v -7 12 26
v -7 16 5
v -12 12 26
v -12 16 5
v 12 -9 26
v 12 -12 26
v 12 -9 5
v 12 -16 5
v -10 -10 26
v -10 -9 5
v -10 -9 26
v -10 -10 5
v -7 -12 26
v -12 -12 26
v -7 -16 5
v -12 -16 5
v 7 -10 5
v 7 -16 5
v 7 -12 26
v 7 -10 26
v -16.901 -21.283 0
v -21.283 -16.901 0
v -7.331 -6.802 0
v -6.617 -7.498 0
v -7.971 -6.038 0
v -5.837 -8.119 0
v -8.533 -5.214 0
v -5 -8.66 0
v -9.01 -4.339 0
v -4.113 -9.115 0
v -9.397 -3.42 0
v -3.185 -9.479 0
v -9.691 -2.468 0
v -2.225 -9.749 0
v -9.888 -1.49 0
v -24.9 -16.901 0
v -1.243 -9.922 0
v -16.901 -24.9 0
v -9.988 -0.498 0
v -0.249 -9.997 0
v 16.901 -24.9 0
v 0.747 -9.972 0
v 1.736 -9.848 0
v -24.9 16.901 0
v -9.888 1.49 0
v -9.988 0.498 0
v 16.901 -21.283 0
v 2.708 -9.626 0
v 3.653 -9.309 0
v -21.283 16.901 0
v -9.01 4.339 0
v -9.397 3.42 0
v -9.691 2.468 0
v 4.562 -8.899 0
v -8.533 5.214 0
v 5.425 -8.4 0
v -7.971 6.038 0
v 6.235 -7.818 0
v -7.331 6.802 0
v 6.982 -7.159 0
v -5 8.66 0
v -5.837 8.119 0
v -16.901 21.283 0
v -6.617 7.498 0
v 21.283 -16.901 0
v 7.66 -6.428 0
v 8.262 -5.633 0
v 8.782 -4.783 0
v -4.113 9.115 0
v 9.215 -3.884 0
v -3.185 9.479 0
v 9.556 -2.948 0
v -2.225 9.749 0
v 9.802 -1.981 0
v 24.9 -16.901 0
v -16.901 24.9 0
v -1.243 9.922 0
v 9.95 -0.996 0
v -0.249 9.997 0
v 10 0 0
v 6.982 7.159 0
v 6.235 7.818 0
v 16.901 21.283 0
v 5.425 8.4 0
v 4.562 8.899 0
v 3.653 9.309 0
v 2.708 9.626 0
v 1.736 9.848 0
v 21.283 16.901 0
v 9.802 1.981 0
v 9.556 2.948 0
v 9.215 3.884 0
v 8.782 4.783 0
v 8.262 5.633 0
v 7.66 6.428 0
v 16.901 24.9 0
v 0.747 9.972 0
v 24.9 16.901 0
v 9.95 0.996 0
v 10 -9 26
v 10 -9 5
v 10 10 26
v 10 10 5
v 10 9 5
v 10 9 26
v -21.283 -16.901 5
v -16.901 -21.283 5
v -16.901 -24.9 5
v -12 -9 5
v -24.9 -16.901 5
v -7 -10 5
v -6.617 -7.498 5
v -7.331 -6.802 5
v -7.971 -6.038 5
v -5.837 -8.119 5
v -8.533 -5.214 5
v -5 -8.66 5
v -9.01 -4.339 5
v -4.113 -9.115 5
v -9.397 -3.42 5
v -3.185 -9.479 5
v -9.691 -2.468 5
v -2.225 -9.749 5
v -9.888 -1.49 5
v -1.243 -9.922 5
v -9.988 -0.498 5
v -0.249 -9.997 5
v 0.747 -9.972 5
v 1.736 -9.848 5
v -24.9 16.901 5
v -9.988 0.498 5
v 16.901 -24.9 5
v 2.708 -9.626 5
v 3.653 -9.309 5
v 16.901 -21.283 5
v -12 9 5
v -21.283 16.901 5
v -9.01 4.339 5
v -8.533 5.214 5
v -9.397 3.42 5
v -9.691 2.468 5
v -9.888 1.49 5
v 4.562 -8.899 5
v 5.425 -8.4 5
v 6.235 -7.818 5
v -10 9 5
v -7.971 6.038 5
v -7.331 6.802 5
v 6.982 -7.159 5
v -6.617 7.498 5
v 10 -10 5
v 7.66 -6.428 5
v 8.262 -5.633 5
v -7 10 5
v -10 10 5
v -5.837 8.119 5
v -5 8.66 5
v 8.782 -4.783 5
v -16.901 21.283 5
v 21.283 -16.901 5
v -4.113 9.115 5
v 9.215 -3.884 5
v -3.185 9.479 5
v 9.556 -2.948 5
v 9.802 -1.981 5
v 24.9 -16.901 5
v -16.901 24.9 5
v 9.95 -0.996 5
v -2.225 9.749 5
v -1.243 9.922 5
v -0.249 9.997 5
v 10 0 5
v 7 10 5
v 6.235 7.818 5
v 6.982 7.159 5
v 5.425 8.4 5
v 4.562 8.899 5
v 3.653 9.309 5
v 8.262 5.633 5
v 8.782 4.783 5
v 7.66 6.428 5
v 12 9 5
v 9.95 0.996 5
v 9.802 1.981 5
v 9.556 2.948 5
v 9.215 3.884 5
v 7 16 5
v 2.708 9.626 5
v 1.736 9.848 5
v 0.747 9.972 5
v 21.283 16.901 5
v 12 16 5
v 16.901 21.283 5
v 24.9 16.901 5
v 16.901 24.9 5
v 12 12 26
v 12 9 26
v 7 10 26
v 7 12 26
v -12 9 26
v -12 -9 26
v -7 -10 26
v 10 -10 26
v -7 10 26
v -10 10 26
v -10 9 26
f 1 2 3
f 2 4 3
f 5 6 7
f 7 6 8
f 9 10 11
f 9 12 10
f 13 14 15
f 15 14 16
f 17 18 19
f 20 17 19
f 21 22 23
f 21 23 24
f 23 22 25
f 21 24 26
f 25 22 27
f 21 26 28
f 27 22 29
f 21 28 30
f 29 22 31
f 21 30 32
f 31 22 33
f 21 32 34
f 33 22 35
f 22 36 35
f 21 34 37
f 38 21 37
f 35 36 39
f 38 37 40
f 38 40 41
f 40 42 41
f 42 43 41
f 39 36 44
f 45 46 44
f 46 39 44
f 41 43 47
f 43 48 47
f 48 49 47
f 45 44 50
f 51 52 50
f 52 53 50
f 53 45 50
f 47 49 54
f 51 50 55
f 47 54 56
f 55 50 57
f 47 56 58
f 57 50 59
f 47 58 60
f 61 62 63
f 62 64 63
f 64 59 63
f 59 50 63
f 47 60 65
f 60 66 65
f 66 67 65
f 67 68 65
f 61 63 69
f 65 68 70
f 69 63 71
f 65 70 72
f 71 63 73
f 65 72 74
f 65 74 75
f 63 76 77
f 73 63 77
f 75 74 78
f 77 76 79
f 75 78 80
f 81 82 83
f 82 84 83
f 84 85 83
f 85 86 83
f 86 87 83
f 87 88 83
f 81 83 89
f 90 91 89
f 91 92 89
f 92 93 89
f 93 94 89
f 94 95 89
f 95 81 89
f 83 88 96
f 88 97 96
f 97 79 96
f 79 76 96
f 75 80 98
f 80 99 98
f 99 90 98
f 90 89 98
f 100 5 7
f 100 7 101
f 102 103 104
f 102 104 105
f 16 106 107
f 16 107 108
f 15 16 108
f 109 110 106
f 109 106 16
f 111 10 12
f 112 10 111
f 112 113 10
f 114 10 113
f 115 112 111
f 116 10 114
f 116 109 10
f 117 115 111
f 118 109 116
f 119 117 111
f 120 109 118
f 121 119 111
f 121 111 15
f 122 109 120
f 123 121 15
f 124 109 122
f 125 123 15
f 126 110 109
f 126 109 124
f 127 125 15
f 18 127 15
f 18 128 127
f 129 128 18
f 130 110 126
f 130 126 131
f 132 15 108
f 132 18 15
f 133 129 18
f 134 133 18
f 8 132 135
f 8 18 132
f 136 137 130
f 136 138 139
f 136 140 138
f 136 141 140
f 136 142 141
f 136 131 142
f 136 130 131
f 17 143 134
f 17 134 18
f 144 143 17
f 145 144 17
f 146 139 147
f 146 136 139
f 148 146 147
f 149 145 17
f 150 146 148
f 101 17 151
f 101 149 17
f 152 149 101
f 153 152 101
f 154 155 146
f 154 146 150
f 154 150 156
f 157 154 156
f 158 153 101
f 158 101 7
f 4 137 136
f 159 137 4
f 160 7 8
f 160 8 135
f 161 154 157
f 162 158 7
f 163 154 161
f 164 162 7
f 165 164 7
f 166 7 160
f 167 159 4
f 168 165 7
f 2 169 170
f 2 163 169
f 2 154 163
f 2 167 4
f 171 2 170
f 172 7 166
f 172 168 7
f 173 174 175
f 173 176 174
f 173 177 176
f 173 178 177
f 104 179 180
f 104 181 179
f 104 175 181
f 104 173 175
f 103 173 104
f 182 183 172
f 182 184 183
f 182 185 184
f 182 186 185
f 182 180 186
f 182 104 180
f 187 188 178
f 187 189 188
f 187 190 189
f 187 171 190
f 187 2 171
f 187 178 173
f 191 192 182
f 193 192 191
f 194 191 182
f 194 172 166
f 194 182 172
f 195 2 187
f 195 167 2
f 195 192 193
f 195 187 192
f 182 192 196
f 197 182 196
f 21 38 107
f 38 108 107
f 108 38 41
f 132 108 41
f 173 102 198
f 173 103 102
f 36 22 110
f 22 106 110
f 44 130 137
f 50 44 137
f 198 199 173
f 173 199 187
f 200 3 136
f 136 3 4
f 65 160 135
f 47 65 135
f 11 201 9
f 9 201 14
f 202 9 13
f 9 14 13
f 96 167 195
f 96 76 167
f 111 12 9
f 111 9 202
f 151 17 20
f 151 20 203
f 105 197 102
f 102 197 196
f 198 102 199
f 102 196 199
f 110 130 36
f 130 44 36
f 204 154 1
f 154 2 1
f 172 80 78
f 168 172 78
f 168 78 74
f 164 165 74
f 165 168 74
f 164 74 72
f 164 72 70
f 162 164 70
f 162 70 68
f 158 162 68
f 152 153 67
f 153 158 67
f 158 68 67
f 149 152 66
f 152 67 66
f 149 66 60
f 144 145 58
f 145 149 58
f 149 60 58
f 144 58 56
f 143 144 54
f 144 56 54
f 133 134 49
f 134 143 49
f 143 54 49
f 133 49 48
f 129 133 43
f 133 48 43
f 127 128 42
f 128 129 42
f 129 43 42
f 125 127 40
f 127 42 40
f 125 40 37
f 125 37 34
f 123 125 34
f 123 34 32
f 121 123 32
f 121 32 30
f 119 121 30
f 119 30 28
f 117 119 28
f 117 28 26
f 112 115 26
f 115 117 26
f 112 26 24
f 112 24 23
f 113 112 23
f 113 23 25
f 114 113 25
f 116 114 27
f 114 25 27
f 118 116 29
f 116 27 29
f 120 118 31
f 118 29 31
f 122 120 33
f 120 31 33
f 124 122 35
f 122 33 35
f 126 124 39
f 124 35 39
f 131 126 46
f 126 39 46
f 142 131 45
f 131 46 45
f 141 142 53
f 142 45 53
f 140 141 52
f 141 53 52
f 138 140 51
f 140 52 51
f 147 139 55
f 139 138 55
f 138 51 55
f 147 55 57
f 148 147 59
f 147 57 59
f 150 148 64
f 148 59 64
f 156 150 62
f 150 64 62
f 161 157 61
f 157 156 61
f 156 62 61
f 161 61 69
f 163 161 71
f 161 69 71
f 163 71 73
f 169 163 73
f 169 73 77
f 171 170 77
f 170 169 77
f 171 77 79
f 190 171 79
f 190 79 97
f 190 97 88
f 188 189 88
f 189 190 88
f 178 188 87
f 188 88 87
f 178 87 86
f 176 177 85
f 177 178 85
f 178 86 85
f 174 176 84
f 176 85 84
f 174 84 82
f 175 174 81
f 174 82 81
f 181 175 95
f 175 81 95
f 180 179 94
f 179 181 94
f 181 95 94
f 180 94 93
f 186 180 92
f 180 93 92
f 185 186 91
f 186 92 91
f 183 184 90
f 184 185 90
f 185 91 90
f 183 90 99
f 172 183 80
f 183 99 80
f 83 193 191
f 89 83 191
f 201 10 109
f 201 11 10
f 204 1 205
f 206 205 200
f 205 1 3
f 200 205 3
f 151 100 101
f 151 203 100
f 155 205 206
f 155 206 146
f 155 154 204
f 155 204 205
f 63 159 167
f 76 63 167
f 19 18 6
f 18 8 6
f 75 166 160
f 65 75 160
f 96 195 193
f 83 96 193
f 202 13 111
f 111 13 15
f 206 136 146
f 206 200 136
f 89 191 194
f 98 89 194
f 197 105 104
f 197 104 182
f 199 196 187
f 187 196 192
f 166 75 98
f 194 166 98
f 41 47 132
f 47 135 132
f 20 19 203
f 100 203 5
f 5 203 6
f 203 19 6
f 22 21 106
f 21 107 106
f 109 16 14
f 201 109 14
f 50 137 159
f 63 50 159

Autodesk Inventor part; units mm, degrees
ref_plane "YZ Plane" through (0, 0, 0) normal (1, 0, 0) x (0, 1, 0)
ref_plane "XZ Plane" through (0, 0, 0) normal (0, 1, 0) x (-1, 0, 0)
ref_plane "XY Plane" through (0, 0, 0) normal (0, 0, 1) x (1, 0, 0)
sketch "Sketch1" plane through (0, 0, 0) normal (0, 0, 1) x (1, 0, 0)
  line L0 (-34.86, 0) -> (34.86, 0) construction
  line L1 (0, -34.86) -> (0, 34.86) construction
  line L2 (0, 0) -> (16.9726, 16.9726) construction
  line L3 (0, 0) -> (24.0028, 0) construction
  line L4 (0, 24.9) -> (16.8009, 24.9)
  line L5 (16.8009, 24.9) -> (16.8009, 21.2415)
  line L6 (16.8009, 21.2415) -> (19.0212, 19.0212)
  line L7 (24.9, 0) -> (24.9, 16.8009)
  line L8 (24.9, 16.8009) -> (21.2415, 16.8009)
  line L9 (21.2415, 16.8009) -> (19.0212, 19.0212)
  line L10 (0, -24.9) -> (16.8009, -24.9)
  line L11 (16.8009, -24.9) -> (16.8009, -21.2415)
  line L12 (16.8009, -21.2415) -> (19.0212, -19.0212)
  line L13 (24.9, 0) -> (24.9, -16.8009)
  line L14 (24.9, -16.8009) -> (21.2415, -16.8009)
  line L15 (21.2415, -16.8009) -> (19.0212, -19.0212)
  line L16 (0, 0) -> (-16.9726, 16.9726) construction
  line L17 (0, 0) -> (-24.0028, 0) construction
  line L18 (0, 24.9) -> (-16.8009, 24.9)
  line L19 (-16.8009, 24.9) -> (-16.8009, 21.2415)
  line L20 (-16.8009, 21.2415) -> (-19.0212, 19.0212)
  line L21 (-24.9, 0) -> (-24.9, 16.8009)
  line L22 (-24.9, 16.8009) -> (-21.2415, 16.8009)
  line L23 (-21.2415, 16.8009) -> (-19.0212, 19.0212)
  line L24 (0, -24.9) -> (-16.8009, -24.9)
  line L25 (-16.8009, -24.9) -> (-16.8009, -21.2415)
  line L26 (-16.8009, -21.2415) -> (-19.0212, -19.0212)
  line L27 (-21.2415, -16.8009) -> (-19.0212, -19.0212)
  line L28 (-24.9, -16.8009) -> (-21.2415, -16.8009)
  line L29 (-24.9, 0) -> (-24.9, -16.8009)
  circle A0 centre (0, 0) radius 10
  dimension "d17" = 45
  dimension "d18" = 24.9
  dimension "d20" = 3.14
  dimension "d21" = 26.9
  dimension "d22" = 20
extrude "Extrusion1" add sketch "Sketch1" along normal blind 5
sketch "Sketch2" plane through (0, 0, 5) normal (0, 0, 1) x (1, 0, 0)
  circle A0 centre (0, 0) radius 10 projected
  line L0 (16.8009, 24.9) -> (-16.8009, 24.9) projected
  line L1 (-16.8009, 24.9) -> (-16.8009, 21.2415) projected
  line L2 (-16.8009, 21.2415) -> (-21.2415, 16.8009) projected
  line L3 (-21.2415, 16.8009) -> (-24.9, 16.8009) projected
  line L4 (-24.9, 16.8009) -> (-24.9, -16.8009) projected
  line L5 (-24.9, -16.8009) -> (-21.2415, -16.8009) projected
  line L6 (-21.2415, -16.8009) -> (-16.8009, -21.2415) projected
  line L7 (-16.8009, -21.2415) -> (-16.8009, -24.9) projected
  line L8 (-16.8009, -24.9) -> (16.8009, -24.9) projected
  line L9 (16.8009, -24.9) -> (16.8009, -21.2415) projected
  line L10 (16.8009, -21.2415) -> (21.2415, -16.8009) projected
  line L11 (21.2415, -16.8009) -> (24.9, -16.8009) projected
  line L12 (24.9, -16.8009) -> (24.9, 16.8009) projected
  line L13 (24.9, 16.8009) -> (21.2415, 16.8009) projected
  line L14 (21.2415, 16.8009) -> (16.8009, 21.2415) projected
  line L15 (16.8009, 21.2415) -> (16.8009, 24.9) projected
  line L16 (0, -34.86) -> (0, 34.86) construction
  line L17 (-12, 12) -> (-7, 12)
  line L18 (-7, 12) -> (-7, 10)
  line L19 (-7, 10) -> (-12, 10)
  line L20 (-12, 10) -> (-12, 12)
  dimension "d27" = 2
  dimension "d28" = 5
  dimension "d29" = 12
extrude "Extrusion2" add sketch "Sketch2" along normal blind 21 contours L17 L18 L19 L20
sketch "Sketch4" plane through (-12, 10, 5) normal (-1, 0, 0) x (0, 0, 1)
  line L0 (0, 0) -> (0, 2) projected
  line L1 (0, 0) -> (21, 0) projected
  line L2 (21, 2) -> (21, 0) projected
  line L3 (0, 2) -> (21, 2) projected
  line L4 (0, 6.8009) -> (0, -26.8009) projected
  line L5 (0, 2) -> (21, 2) projected
  line L6 (21, 2) -> (0, 2)
  line L7 (0, 2) -> (0, 6)
  line L8 (0, -26.8009) -> (0, 6.8009) projected
  line L9 (0, 6) -> (21, 2)
  point P0 (-5, -10)
  dimension "d35" = 4
extrude "Extrusion4" add sketch "Sketch4" against normal up to surface (5 mm away) contours L4 L9 L3
sketch "Sketch5" plane through (-12, 10, 5) normal (0, -1, 0) x (1, 0, 0)
  line L0 (5, 21) -> (5, 0) projected
  line L1 (0, 0) -> (5, 0) projected
  line L2 (0, 21) -> (0, 0) projected
  line L3 (5, 21) -> (0, 21) projected
  line L4 (12, -10.2) -> (12, 26.2) construction
  line L5 (0, 21) -> (2, 21)
  line L6 (2, 21) -> (2, 0)
  line L7 (2, 0) -> (0, 0)
  line L8 (0, 0) -> (0, 21)
  point P0 (12, -5)
  dimension "d38" = 10
extrude "Extrusion5" add sketch "Sketch5" along normal blind 1 contours L6 L1 L2 L3
mirror "Mirror1" about plane through (0, 0, 0) normal (0, 1, 0) of "Extrusion2", "Extrusion4", "Extrusion5"
mirror "Mirror2" about plane through (0, 0, 0) normal (1, 0, 0) of "Extrusion2", "Extrusion4", "Mirror1", "Extrusion5"
sketch "Skizze6" plane through (0, 0, 5) normal (0, 0, 1) x (1, 0, 0)
  line L0 (12, -16) -> (7, -16) construction
  line L1 (7, -16) -> (7, -10) construction
  line L2 (7, -10) -> (10, -10) construction
  line L3 (10, -10) -> (10, -9) construction
  line L4 (10, -9) -> (12, -9) construction
  line L5 (12, -9) -> (12, -16) construction
  line L6 (7, 16) -> (12, 16) construction
  line L7 (12, 16) -> (12, 9) construction
  line L8 (12, 9) -> (10, 9) construction
  line L9 (10, 9) -> (10, 10) construction
  line L10 (10, 10) -> (7, 10) construction
  line L11 (7, 10) -> (7, 16) construction
  line L12 (-7, -16) -> (-12, -16) construction
  line L13 (-12, -16) -> (-12, -9) construction
  line L14 (-12, -9) -> (-10, -9) construction
  line L15 (-10, -9) -> (-10, -10) construction
  line L16 (-10, -10) -> (-7, -10) construction
  line L17 (-7, -10) -> (-7, -16) construction
  line L18 (-12, 9) -> (-12, 16) construction
  line L19 (-12, 16) -> (-7, 16) construction
  line L20 (-7, 16) -> (-7, 10) construction
  line L21 (-7, 10) -> (-10, 10) construction
  line L22 (-10, 10) -> (-10, 9) construction
  line L23 (-10, 9) -> (-12, 9) construction
  circle A0 centre (0, 0) radius 10 construction
  line L24 (16.8009, 24.9) -> (-16.8009, 24.9) construction
  line L25 (-16.8009, 24.9) -> (-16.8009, 21.2415) projected
  line L26 (-16.8009, 21.2415) -> (-21.2415, 16.8009) projected
  line L27 (-21.2415, 16.8009) -> (-24.9, 16.8009) projected
  line L28 (-24.9, 16.8009) -> (-24.9, -16.8009) construction
  line L29 (-24.9, -16.8009) -> (-21.2415, -16.8009) projected
  line L30 (-21.2415, -16.8009) -> (-16.8009, -21.2415) projected
  line L31 (-16.8009, -21.2415) -> (-16.8009, -24.9) projected
  line L32 (-16.8009, -24.9) -> (16.8009, -24.9) construction
  line L33 (16.8009, -24.9) -> (16.8009, -21.2415) projected
  line L34 (16.8009, -21.2415) -> (21.2415, -16.8009) projected
  line L35 (21.2415, -16.8009) -> (24.9, -16.8009) projected
  line L36 (24.9, -16.8009) -> (24.9, 16.8009) construction
  line L37 (24.9, 16.8009) -> (21.2415, 16.8009) projected
  line L38 (21.2415, 16.8009) -> (16.8009, 21.2415) projected
  line L39 (16.8009, 21.2415) -> (16.8009, 24.9) projected
  line L40 (-16.9009, 25) -> (16.9009, 25) construction
  line L41 (16.9009, 25) -> (16.9009, 21.2829)
  line L42 (16.9009, 21.2829) -> (21.2829, 16.9009)
  line L43 (21.2829, 16.9009) -> (25, 16.9009)
  line L44 (25, 16.9009) -> (25, -16.9009) construction
  line L45 (25, -16.9009) -> (21.2829, -16.9009)
  line L46 (21.2829, -16.9009) -> (16.9009, -21.2829)
  line L47 (16.9009, -21.2829) -> (16.9009, -25)
  line L48 (16.9009, -25) -> (-16.9009, -25) construction
  line L49 (-16.9009, -25) -> (-16.9009, -21.2829)
  line L50 (-16.9009, -21.2829) -> (-21.2829, -16.9009)
  line L51 (-21.2829, -16.9009) -> (-25, -16.9009)
  line L52 (-25, -16.9009) -> (-25, 16.9009) construction
  line L53 (-25, 16.9009) -> (-21.2829, 16.9009)
  line L54 (-21.2829, 16.9009) -> (-16.9009, 21.2829)
  line L55 (-16.9009, 21.2829) -> (-16.9009, 25)
  line L56 (-24.9, 16.8009) -> (-24.9, 16.9009)
  line L57 (-16.8009, 24.9) -> (-16.9009, 24.9)
  line L58 (16.8009, 24.9) -> (-16.8009, 24.9) projected
  line L59 (16.8009, 24.9) -> (16.9009, 24.9)
  line L60 (24.9, 16.8009) -> (24.9, 16.9009)
  line L61 (16.8009, -24.9) -> (16.9009, -24.9)
  line L62 (21.2415, -16.8009) -> (24.9, -16.8009) projected
  line L63 (24.9, -16.8009) -> (24.9, -16.9009)
  line L64 (-16.8009, -24.9) -> (-16.9009, -24.9)
  line L65 (-24.9, -16.8009) -> (-21.2415, -16.8009) projected
  line L66 (-24.9, -16.8009) -> (-24.9, -16.9009)
  dimension "d17" = 45
  dimension "d18" = 24.9
  dimension "d20" = 3.14
  dimension "d21" = 26.9
  dimension "d41" = 0.1
extrude "IM_offset" add sketch "Skizze6" against normal up to surface (5 mm away)
properties part number "20_Cube_Insert_Beamsplitter_v3"
